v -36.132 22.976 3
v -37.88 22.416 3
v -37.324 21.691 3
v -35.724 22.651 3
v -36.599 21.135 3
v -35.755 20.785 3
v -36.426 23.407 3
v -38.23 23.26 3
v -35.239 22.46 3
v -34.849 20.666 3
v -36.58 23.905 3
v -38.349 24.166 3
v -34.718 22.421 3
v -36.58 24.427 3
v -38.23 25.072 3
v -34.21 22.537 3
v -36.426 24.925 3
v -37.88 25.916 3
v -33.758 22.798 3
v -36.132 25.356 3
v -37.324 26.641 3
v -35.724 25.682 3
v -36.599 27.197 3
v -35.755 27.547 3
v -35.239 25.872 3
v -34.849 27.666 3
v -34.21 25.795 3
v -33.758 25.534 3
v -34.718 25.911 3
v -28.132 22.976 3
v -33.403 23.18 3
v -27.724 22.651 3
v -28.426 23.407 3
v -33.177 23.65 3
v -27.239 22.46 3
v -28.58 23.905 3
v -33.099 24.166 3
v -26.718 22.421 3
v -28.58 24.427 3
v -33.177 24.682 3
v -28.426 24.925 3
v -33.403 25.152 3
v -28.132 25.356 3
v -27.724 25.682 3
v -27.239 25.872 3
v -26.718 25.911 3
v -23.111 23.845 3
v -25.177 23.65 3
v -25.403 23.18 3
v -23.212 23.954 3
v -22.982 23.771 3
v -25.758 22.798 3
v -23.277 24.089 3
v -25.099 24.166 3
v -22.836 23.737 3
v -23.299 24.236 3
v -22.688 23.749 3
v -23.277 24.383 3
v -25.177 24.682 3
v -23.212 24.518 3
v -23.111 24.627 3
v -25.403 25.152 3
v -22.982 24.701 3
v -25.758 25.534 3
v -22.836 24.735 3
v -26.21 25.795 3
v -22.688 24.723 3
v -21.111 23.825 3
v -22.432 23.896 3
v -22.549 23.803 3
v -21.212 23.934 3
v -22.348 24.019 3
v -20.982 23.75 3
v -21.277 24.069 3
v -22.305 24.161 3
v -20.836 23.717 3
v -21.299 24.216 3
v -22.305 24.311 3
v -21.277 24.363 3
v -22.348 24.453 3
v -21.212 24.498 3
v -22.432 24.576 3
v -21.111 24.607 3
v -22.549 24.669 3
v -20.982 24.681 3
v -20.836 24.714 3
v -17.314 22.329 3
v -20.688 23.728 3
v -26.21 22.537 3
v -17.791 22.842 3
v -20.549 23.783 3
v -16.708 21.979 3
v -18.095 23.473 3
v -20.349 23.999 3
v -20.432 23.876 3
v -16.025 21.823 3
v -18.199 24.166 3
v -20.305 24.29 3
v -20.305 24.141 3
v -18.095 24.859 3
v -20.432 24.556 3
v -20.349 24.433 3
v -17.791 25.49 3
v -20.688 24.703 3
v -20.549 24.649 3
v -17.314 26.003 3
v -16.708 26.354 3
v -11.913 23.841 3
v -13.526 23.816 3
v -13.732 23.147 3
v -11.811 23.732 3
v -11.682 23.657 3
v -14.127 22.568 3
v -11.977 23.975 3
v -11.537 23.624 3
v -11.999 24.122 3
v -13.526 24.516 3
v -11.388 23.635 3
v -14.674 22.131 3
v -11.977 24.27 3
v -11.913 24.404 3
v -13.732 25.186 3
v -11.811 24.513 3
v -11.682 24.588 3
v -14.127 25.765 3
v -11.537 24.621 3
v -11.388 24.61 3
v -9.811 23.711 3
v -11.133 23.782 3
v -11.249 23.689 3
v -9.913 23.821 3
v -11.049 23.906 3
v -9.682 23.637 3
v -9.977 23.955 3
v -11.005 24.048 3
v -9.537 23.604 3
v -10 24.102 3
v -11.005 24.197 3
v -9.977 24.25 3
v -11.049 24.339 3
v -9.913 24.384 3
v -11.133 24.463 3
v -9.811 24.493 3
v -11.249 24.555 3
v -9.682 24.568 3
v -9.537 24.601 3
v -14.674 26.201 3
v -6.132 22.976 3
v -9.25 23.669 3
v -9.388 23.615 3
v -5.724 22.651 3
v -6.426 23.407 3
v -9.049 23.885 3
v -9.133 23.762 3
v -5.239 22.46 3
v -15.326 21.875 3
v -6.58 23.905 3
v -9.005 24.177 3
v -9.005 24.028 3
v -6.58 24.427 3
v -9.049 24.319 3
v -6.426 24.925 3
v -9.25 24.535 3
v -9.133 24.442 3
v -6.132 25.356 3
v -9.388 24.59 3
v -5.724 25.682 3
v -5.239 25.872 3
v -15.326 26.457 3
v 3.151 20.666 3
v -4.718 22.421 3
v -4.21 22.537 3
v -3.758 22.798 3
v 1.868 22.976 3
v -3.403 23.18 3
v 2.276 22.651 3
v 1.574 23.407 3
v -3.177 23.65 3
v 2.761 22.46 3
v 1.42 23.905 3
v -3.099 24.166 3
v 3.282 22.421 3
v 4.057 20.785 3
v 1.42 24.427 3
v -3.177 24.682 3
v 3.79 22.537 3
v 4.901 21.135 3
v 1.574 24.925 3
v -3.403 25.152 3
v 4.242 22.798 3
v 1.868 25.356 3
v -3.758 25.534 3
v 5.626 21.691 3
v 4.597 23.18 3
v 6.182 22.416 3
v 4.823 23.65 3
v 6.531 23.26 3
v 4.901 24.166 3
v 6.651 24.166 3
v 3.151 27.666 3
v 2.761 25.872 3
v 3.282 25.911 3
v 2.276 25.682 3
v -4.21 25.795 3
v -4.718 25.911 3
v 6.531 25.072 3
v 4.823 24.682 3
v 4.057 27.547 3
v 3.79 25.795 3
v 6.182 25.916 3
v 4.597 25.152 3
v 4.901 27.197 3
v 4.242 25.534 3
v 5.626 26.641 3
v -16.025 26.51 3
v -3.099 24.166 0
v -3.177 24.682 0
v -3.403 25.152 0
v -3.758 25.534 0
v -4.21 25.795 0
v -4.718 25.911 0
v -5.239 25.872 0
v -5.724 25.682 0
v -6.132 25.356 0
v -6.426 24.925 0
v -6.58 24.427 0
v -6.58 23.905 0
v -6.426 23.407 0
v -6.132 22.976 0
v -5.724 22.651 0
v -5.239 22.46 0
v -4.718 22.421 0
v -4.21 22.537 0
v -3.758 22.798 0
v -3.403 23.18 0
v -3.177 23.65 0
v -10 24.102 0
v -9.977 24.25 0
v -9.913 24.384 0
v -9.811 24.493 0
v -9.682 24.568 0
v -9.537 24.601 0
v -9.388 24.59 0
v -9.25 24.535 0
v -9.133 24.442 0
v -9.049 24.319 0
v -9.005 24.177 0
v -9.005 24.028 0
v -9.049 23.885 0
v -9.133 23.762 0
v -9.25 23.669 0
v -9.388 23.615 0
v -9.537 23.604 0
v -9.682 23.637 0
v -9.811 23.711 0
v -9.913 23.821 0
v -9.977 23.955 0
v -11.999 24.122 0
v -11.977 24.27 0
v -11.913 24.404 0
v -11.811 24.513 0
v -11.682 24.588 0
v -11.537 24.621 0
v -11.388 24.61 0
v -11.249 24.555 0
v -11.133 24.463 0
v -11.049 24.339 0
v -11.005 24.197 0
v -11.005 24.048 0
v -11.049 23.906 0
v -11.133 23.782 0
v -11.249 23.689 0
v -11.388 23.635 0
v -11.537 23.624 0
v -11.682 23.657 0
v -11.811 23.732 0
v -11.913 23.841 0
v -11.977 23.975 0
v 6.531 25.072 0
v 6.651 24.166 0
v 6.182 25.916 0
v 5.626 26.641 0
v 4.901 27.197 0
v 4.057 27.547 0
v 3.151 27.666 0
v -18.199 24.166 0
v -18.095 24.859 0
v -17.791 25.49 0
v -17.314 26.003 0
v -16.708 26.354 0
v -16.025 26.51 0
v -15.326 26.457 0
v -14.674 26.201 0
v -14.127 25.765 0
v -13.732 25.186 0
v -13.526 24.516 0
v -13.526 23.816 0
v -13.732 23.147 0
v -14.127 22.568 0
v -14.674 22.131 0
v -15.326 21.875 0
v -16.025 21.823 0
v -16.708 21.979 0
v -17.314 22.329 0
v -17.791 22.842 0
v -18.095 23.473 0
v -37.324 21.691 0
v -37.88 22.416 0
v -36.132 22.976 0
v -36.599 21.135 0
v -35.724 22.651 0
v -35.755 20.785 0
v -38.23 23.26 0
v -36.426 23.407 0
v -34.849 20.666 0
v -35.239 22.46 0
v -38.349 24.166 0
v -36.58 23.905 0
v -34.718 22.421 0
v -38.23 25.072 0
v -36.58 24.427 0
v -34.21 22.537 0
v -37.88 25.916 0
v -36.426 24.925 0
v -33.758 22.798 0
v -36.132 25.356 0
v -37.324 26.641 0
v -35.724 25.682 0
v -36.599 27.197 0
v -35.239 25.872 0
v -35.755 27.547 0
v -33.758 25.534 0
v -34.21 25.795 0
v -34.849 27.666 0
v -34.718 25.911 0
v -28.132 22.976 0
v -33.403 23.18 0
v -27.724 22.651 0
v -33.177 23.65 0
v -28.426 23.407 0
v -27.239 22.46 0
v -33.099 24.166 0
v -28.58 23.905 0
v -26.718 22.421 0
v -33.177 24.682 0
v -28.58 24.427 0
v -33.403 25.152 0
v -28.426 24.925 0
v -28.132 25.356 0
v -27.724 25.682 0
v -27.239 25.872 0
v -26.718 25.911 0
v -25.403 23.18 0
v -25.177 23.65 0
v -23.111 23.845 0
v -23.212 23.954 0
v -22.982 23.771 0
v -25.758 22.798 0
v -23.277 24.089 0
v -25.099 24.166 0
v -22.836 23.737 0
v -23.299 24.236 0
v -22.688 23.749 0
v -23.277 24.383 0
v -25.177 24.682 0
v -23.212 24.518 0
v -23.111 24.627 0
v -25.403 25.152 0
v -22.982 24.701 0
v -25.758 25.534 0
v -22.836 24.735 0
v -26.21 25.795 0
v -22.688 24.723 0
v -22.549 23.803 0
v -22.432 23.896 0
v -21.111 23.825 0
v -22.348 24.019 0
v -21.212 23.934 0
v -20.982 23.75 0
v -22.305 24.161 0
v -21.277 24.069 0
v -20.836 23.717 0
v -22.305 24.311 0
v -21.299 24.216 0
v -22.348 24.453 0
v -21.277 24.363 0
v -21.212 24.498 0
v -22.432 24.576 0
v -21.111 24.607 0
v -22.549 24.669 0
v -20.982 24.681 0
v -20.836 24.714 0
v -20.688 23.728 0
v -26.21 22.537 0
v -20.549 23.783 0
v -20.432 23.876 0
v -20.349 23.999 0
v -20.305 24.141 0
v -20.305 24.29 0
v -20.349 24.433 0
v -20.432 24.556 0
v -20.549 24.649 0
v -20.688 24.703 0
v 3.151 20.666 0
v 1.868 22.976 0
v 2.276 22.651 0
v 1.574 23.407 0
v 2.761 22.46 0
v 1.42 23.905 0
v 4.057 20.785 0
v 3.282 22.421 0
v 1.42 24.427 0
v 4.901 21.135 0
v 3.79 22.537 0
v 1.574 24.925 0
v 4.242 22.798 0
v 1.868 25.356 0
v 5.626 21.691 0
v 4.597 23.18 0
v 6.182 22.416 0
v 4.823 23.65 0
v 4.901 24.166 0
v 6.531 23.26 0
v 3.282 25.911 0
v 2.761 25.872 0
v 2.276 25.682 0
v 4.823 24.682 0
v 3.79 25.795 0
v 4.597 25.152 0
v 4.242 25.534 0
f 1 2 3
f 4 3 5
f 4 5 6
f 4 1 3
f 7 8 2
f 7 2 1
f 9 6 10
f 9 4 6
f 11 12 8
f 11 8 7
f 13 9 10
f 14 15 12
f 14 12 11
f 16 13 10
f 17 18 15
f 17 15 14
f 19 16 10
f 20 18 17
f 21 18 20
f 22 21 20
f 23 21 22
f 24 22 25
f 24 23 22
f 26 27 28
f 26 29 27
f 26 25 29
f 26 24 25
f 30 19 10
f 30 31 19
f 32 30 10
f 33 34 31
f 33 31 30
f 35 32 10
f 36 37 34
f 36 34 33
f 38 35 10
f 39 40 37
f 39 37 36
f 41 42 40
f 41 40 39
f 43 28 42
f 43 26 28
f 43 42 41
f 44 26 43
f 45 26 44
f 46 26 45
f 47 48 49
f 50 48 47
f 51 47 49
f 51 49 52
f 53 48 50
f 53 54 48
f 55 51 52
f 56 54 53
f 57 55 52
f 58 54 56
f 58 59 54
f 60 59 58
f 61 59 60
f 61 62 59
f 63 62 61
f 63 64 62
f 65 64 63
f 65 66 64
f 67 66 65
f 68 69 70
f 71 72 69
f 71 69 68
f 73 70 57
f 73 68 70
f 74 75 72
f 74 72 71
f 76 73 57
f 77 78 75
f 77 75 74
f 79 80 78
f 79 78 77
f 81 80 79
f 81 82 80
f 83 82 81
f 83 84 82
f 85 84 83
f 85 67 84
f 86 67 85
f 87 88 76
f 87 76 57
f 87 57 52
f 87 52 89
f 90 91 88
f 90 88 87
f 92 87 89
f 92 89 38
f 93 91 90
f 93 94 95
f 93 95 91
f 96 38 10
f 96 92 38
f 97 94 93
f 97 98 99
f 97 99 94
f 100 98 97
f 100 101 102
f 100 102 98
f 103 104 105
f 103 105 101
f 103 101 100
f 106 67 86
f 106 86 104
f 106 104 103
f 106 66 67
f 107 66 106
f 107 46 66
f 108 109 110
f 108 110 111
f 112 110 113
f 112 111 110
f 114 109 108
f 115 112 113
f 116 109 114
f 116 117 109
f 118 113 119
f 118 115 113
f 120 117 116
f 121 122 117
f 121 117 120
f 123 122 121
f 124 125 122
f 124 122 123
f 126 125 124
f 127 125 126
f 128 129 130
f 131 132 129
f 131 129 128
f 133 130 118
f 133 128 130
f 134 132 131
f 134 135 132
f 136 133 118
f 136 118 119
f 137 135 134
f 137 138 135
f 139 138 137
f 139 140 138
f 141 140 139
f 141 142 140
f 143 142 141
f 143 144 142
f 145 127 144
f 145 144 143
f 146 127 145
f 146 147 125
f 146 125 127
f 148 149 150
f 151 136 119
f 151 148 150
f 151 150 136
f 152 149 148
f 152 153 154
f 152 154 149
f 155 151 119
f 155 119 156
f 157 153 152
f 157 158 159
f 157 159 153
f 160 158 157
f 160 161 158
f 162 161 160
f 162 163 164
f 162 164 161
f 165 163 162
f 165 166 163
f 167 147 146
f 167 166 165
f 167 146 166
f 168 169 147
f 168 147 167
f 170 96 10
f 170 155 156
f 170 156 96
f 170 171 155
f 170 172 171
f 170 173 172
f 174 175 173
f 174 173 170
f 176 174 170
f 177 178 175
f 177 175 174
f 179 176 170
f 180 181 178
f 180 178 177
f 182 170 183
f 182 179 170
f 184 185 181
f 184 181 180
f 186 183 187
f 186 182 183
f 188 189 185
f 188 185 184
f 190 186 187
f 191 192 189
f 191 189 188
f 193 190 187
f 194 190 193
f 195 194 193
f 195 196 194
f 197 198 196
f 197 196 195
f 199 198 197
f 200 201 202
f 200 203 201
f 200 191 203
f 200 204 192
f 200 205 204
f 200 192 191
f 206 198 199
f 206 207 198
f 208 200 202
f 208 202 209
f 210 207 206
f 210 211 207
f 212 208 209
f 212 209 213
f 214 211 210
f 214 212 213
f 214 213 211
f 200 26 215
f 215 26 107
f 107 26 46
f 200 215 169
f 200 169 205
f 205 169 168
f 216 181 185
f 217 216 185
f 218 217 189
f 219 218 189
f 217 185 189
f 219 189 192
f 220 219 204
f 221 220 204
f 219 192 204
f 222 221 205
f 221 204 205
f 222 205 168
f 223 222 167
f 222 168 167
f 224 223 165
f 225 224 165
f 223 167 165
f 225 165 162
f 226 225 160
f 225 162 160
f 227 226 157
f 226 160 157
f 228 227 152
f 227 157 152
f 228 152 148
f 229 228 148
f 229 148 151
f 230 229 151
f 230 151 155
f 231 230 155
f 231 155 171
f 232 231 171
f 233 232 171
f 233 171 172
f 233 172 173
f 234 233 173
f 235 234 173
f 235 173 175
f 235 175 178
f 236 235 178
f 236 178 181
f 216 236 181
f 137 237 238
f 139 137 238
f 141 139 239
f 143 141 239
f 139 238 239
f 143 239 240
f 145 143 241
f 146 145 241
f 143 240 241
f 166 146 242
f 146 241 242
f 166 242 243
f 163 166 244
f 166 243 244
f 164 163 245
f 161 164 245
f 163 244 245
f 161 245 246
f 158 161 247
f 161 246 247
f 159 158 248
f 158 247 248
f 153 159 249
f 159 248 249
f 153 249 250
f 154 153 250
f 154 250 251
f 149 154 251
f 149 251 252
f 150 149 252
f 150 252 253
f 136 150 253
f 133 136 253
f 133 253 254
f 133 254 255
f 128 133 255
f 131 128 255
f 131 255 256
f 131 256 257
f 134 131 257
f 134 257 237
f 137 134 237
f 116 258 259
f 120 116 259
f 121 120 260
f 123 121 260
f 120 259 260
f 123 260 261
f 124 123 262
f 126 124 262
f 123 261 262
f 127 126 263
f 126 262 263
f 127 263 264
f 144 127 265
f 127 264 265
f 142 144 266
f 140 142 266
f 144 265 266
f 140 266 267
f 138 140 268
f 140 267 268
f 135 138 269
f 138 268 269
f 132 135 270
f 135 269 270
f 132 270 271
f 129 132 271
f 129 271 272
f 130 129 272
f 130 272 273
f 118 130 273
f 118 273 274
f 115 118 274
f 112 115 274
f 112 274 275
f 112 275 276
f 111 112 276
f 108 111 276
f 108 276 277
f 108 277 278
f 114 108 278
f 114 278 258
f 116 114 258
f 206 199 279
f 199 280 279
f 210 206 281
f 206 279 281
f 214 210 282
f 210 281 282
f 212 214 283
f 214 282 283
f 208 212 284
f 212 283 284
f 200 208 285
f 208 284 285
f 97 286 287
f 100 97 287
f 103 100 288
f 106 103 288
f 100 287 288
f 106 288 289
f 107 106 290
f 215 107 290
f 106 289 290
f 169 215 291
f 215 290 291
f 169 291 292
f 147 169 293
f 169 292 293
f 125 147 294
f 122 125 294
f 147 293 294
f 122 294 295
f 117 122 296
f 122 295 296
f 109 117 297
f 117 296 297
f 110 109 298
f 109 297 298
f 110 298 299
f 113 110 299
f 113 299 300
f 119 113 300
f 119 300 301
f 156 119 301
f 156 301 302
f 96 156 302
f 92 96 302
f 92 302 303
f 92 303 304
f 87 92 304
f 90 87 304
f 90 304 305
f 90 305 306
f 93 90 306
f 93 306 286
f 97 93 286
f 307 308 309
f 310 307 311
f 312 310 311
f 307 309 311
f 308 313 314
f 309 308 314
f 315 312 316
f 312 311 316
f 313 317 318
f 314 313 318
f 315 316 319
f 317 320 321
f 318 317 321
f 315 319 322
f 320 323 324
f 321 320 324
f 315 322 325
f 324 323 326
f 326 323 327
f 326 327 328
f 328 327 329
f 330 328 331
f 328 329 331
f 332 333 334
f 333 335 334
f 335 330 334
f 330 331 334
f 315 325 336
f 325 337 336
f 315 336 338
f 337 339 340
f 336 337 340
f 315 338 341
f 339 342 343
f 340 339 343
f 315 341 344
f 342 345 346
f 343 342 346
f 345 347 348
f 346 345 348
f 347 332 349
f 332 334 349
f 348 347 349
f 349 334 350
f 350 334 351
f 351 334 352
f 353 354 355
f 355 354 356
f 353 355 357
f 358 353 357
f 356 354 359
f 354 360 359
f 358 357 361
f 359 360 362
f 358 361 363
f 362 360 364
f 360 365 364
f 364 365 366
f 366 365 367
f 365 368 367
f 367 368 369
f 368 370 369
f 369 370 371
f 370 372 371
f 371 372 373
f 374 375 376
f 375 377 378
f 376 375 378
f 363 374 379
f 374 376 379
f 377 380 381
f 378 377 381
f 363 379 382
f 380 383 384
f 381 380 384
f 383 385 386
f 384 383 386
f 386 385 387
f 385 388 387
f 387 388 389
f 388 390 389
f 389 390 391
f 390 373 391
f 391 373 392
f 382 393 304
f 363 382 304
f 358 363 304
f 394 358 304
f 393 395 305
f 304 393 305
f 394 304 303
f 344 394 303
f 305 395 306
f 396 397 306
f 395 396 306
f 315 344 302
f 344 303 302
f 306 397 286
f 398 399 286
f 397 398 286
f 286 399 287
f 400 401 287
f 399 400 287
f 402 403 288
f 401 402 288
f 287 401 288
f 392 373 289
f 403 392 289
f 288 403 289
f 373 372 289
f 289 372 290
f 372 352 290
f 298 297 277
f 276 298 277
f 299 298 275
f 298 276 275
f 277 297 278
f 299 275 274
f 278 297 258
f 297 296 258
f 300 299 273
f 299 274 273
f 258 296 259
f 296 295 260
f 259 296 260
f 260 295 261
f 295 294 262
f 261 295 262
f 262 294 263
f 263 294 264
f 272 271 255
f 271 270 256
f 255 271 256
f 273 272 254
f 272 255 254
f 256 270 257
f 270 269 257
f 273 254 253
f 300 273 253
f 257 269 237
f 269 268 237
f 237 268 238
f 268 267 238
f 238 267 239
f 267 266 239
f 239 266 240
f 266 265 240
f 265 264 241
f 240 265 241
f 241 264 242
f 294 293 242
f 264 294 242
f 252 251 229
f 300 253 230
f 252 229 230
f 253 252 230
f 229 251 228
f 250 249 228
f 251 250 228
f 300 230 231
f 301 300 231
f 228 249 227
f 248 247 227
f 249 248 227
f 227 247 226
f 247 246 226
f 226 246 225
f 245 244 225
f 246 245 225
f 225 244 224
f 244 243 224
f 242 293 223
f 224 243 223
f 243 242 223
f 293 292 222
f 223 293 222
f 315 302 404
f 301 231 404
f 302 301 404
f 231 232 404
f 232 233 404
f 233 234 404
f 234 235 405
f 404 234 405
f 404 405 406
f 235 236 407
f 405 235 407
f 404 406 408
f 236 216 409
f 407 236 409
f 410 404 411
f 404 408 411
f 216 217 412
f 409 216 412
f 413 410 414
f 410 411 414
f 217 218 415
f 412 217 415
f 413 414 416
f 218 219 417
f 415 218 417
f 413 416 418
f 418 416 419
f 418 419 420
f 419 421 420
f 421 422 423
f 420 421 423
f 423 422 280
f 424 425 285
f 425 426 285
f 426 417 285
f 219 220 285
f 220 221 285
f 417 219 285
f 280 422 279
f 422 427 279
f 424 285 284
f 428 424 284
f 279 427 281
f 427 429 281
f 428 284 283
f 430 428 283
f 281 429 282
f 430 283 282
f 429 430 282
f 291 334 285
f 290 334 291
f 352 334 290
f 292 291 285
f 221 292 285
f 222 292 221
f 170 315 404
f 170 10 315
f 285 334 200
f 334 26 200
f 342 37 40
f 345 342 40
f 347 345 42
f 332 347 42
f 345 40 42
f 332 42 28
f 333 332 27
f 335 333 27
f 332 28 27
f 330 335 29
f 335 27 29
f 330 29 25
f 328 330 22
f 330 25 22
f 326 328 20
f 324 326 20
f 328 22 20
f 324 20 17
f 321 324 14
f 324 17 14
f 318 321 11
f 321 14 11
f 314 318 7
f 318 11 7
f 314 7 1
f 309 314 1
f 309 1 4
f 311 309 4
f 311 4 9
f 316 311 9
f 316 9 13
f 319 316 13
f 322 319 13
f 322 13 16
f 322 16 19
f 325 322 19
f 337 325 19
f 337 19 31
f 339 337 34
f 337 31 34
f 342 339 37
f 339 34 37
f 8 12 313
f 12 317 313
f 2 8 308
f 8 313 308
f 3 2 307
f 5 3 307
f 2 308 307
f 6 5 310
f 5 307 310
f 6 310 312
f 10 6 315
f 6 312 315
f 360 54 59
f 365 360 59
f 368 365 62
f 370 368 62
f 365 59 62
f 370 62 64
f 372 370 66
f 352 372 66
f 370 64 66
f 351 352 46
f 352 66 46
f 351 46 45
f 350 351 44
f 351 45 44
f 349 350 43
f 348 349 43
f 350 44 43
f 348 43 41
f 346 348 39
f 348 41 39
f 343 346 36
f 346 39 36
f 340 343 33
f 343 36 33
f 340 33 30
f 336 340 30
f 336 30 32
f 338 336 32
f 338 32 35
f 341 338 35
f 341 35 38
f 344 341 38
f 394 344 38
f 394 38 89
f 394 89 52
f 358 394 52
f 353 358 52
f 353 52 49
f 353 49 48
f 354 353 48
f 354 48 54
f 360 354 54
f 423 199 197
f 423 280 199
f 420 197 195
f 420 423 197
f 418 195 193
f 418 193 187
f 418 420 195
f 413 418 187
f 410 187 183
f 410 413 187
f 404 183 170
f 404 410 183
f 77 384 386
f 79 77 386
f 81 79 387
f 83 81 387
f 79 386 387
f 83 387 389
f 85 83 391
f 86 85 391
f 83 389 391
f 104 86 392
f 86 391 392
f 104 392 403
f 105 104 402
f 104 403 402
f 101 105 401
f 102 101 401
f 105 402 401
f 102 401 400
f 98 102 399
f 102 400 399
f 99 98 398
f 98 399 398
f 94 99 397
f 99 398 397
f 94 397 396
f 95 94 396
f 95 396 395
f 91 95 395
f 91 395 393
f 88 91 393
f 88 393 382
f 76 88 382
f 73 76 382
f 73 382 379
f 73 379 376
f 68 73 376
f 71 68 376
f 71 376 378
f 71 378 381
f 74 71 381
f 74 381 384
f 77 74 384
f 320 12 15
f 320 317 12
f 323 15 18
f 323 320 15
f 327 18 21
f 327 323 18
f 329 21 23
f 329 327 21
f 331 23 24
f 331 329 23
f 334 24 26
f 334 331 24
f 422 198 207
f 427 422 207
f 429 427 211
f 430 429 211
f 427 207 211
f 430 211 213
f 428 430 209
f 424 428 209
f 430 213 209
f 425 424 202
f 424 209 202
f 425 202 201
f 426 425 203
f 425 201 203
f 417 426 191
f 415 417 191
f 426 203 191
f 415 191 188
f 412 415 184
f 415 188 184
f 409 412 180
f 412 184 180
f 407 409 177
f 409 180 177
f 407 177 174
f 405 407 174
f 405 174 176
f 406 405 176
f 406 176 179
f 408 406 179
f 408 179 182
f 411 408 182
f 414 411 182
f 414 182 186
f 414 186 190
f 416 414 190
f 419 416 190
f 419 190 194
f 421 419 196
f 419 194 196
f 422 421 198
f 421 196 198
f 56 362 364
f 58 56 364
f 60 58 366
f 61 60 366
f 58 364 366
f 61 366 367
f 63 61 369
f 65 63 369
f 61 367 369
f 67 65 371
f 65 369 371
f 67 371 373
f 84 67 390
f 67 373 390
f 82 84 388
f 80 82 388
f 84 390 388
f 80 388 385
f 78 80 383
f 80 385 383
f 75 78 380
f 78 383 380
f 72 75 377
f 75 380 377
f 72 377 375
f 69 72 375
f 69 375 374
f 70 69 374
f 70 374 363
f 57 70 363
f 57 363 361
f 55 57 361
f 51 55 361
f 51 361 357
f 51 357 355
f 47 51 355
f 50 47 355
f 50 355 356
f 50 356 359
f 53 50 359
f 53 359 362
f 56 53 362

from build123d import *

# Parameters (mm, degrees)
SKETCH1_W                = 68.327661803
SKETCH1_H                = 52.686389824
BOSS_EXTRUDE1_DEPTH      = 3
CUT_EXTRUDE1_DEPTH       = 100
SKETCH4_W                = 3
SKETCH4_H                = 16.961263462
BOSS_EXTRUDE2_DEPTH      = 4
SKETCH5_W                = 3
SKETCH5_H                = 16.961263462
BOSS_EXTRUDE3_DEPTH      = 39.5
SKETCH6_W                = 3
SKETCH6_H                = 16.961263462
BOSS_EXTRUDE4_DEPTH      = 35.754290268
FILLET1_R                = 7.5
FILLET2_R                = 7.5
FILLET3_R                = 7.5
FILLET4_R                = 7.5
SKETCH9_R                = 0.5
CUT_EXTRUDE5_DEPTH       = 14
SKETCH7_R                = 0.5
CUT_EXTRUDE6_DEPTH       = 14
SKETCH10_R               = 2.35
CUT_EXTRUDE7_DEPTH       = 10
SKETCH11_R               = 2.35
CUT_EXTRUDE8_DEPTH       = 10
SKETCH12_R               = 1.5
CUT_EXTRUDE9_DEPTH       = 10
CUT_EXTRUDE_4_DEPTH      = 63.27060323
CUT_EXTRUDE_4_DEPTH_BACK = 63.27060323
SKETCH_2_W               = 38.540786773
SKETCH_2_H               = 30.686503212
SKETCH_1_W               = 58.401406077
SKETCH_1_H               = 28.148942287
SKETCH_1_R               = 0.5
SKETCH_1_W_2             = 30
SKETCH_1_H_2             = 7
SKETCH_1_R_2             = 1.75
CUT_EXTRUDE_7_DEPTH      = 51.962343493
SKETCH_3_W               = 7.5
SKETCH_3_H               = 7
SKETCH_3_R               = 1.75
EXTRUDE_1_DEPTH          = 3
FILLET_2_R               = 3.5


with BuildPart() as part:
    # Sketch1 → Boss-Extrude1 (new body)
    with BuildSketch(Plane.XY):
        with Locations((-34.163830901, 26.343194912)):
            Rectangle(SKETCH1_W, SKETCH1_H)
    extrude(amount=BOSS_EXTRUDE1_DEPTH)

    # Sketch2 → Cut-Extrude1 (cut)
    with BuildSketch(Plane(origin=(0, 0, 0), x_dir=(-1, 0, 0), z_dir=(0, 0, -1))):
        Polygon((34.754290268, 32.233658713), (0, 32.233658713), (0, 52.686389824), (34.754290268, 52.686389824), (68.327661803, 52.686389824), (68.327661803, 0), (34.754290268, 0), (0, 0), (0, 15.272395251), (34.754290268, 15.272395251), align=None)
    extrude(amount=-CUT_EXTRUDE1_DEPTH, mode=Mode.SUBTRACT)

    # Sketch4 → Boss-Extrude2 (add)
    with BuildSketch(Plane.ZY.offset(34.754290268)):
        with Locations((1.5, 23.753026982)):
            Rectangle(SKETCH4_W, SKETCH4_H)
    extrude(amount=BOSS_EXTRUDE2_DEPTH)

    # Sketch5 → Boss-Extrude3 (add)
    with BuildSketch(Plane(origin=(0, 0, 0), x_dir=(-1, 0, 0), z_dir=(0, 0, -1))):
        with Locations((37.254290268, 23.753026982)):
            Rectangle(SKETCH5_W, SKETCH5_H)
    extrude(amount=BOSS_EXTRUDE3_DEPTH)

    # Sketch6 → Boss-Extrude4 (add)
    with BuildSketch(Plane(origin=(-35.754290268, 0, 0), x_dir=(0, 0, -1), z_dir=(1, 0, 0))):
        with Locations((38, 23.753026982)):
            Rectangle(SKETCH6_W, SKETCH6_H)
    extrude(amount=BOSS_EXTRUDE4_DEPTH)

    # Fillet1
    fillet1_edges = [part.edges().sort_by_distance(p)[0] for p in [
        (0, 15.272395251, 1.5),
    ]]
    fillet(fillet1_edges, radius=FILLET1_R)

    # Fillet2
    fillet2_edges = [part.edges().sort_by_distance(p)[0] for p in [
        (0, 32.233658713, 1.5),
    ]]
    fillet(fillet2_edges, radius=FILLET2_R)

    # Fillet3
    fillet3_edges = [part.edges().sort_by_distance(p)[0] for p in [
        (0, 32.233658713, -38),
    ]]
    fillet(fillet3_edges, radius=FILLET3_R)

    # Fillet4
    fillet4_edges = [part.edges().sort_by_distance(p)[0] for p in [
        (0, 15.272395251, -38),
    ]]
    fillet(fillet4_edges, radius=FILLET4_R)

    # Sketch9 → Cut-Extrude5 (cut)
    with BuildSketch(Plane.ZY.offset(38.754290268)):
        with Locations((-13.849226824, 24.283657668)):
            Circle(SKETCH9_R)
        with Locations((-11.849226824, 24.283657668)):
            Circle(SKETCH9_R)
        with Locations((-18.799226824, 19.683657668)):
            Circle(SKETCH9_R)
        with Locations((-18.799226824, 17.683657668)):
            Circle(SKETCH9_R)
        with Locations((-23.149226824, 24.283657668)):
            Circle(SKETCH9_R)
        with Locations((-25.149226824, 24.283657668)):
            Circle(SKETCH9_R)
        with Locations((-18.799226824, 30.633657668)):
            Circle(SKETCH9_R)
        with Locations((-18.799226824, 28.633657668)):
            Circle(SKETCH9_R)
    extrude(amount=-CUT_EXTRUDE5_DEPTH, mode=Mode.SUBTRACT)

    # Sketch7 → Cut-Extrude6 (cut)
    with BuildSketch(Plane(origin=(0, 0, 0), x_dir=(-1, 0, 0), z_dir=(0, 0, -1))):
        with Locations((15.785473329, 30.515840692)):
            Circle(SKETCH7_R)
        with Locations((15.805568543, 28.515941649)):
            Circle(SKETCH7_R)
        with Locations((20.799025765, 24.215896885)):
            Circle(SKETCH7_R)
        with Locations((22.798924808, 24.235992099)):
            Circle(SKETCH7_R)
        with Locations((11.499495215, 24.12245414)):
            Circle(SKETCH7_R)
        with Locations((9.499596172, 24.102358926)):
            Circle(SKETCH7_R)
        with Locations((15.895494626, 19.566393431)):
            Circle(SKETCH7_R)
        with Locations((15.91558984, 17.566494388)):
            Circle(SKETCH7_R)
    extrude(amount=-CUT_EXTRUDE6_DEPTH, mode=Mode.SUBTRACT)

    # Sketch10 → Cut-Extrude7 (cut)
    with BuildSketch(Plane.ZY.offset(38.754290268)):
        with Locations((-18.799226824, 24.283657668)):
            Circle(SKETCH10_R)
    extrude(amount=-CUT_EXTRUDE7_DEPTH, mode=Mode.SUBTRACT)

    # Sketch11 → Cut-Extrude8 (cut)
    with BuildSketch(Plane(origin=(0, 0, 0), x_dir=(-1, 0, 0), z_dir=(0, 0, -1))):
        with Locations((15.849275634, 24.16616123)):
            Circle(SKETCH11_R)
    extrude(amount=-CUT_EXTRUDE8_DEPTH, mode=Mode.SUBTRACT)

    # Sketch12 → Cut-Extrude9 (cut)
    with BuildSketch(Plane.XY.offset(-36.5)):
        with Locations((-15.849275634, 24.16616123)):
            Circle(SKETCH12_R)
    extrude(amount=-CUT_EXTRUDE9_DEPTH, mode=Mode.SUBTRACT)

    # 草圖2 → 除料-伸長4 (cut, two sides: drawn at the far end of the back side and taken through both)
    with BuildSketch(Plane(origin=(-35.754290268, 0, 0), x_dir=(0, 0, -1), z_dir=(1, 0, 0)).offset(-CUT_EXTRUDE_4_DEPTH_BACK)):
        with Locations((23.770839113, 24.432880731)):
            Rectangle(SKETCH_2_W, SKETCH_2_H)
    extrude(amount=CUT_EXTRUDE_4_DEPTH + CUT_EXTRUDE_4_DEPTH_BACK, mode=Mode.SUBTRACT)

    # 草圖1 → 除料-伸長7 (cut, through all)
    # profile 1 of 4: a face of its own
    with BuildSketch(Plane.XY.offset(3)):
        with Locations((-17.675205009, 24.250222974)):
            Rectangle(SKETCH_1_W, SKETCH_1_H)
        with BuildLine():
            Line((0, 22.772395251), (0, 24.733658713))
            ThreePointArc((0, 24.733658713), (-2.196699141, 30.036959572), (-7.5, 32.233658713))
            Line((-7.5, 32.233658713), (-38.754290268, 32.233658713))
            Line((-38.754290268, 32.233658713), (-38.754290268, 15.272395251))
            Line((-38.754290268, 15.272395251), (-7.5, 15.272395251))
            ThreePointArc((-7.5, 15.272395251), (-2.196699141, 17.469094393), (0, 22.772395251))
        make_face(mode=Mode.SUBTRACT)
    # profile 2 of 4: a face of its own
    with BuildSketch(Plane.XY.offset(3)):
        with BuildLine():
            ThreePointArc((-7.5, 15.272395251), (-2.196699141, 17.469094393), (0, 22.772395251))
            Line((0, 22.772395251), (0, 24.733658713))
            ThreePointArc((0, 24.733658713), (-2.196699141, 30.036959572), (-7.5, 32.233658713))
            Line((-7.5, 32.233658713), (-38.754290268, 32.233658713))
            Line((-38.754290268, 32.233658713), (-38.754290268, 15.272395251))
            Line((-38.754290268, 15.272395251), (-7.5, 15.272395251))
        make_face()
        with Locations((-15.91558984, 17.566494388)):
            Circle(SKETCH_1_R, mode=Mode.SUBTRACT)
        with Locations((-15.805568543, 28.515941649)):
            Circle(SKETCH_1_R, mode=Mode.SUBTRACT)
        with Locations((-15.895494626, 19.566393431)):
            Circle(SKETCH_1_R, mode=Mode.SUBTRACT)
        with Locations((-15.785473329, 30.515840692)):
            Circle(SKETCH_1_R, mode=Mode.SUBTRACT)
        with Locations((-15.849275634, 24.16616123)):
            Rectangle(SKETCH_1_W_2, SKETCH_1_H_2, mode=Mode.SUBTRACT)
    # profile 3 of 4: a face of its own
    with BuildSketch(Plane.XY.offset(3)):
        with Locations((-4.849275634, 24.16616123)):
            Circle(SKETCH_1_R_2)
    # profile 4 of 4: a face of its own
    with BuildSketch(Plane.XY.offset(3)):
        with Locations((-26.849275634, 24.16616123)):
            Circle(SKETCH_1_R_2)
    extrude(amount=-CUT_EXTRUDE_7_DEPTH, mode=Mode.SUBTRACT)

    # 草圖3 → 填料-伸長1 (add, through all)
    # profile 1 of 2: a face of its own
    with BuildSketch(Plane.XY.offset(3)):
        with Locations((-34.599275634, 24.16616123)):
            Rectangle(SKETCH_3_W, SKETCH_3_H)
        with Locations((-34.849275634, 24.16616123)):
            Circle(SKETCH_3_R, mode=Mode.SUBTRACT)
    # profile 2 of 2: a face of its own
    with BuildSketch(Plane.XY.offset(3)):
        with Locations((2.900724366, 24.16616123)):
            Rectangle(SKETCH_3_W, SKETCH_3_H)
        with Locations((3.150724366, 24.16616123)):
            Circle(SKETCH_3_R, mode=Mode.SUBTRACT)
    extrude(amount=-EXTRUDE_1_DEPTH)

    # 圓角2
    fillet_2_edges = [part.edges().sort_by_distance(p)[0] for p in [
        (6.650724366, 20.66616123, 1.5),
        (6.650724366, 27.66616123, 1.5),
        (-38.349275634, 20.66616123, 1.5),
        (-38.349275634, 27.66616123, 1.5),
    ]]
    fillet(fillet_2_edges, radius=FILLET_2_R - 0.0001)  # a hair under: the kernel refuses the full size


solid = part.part
